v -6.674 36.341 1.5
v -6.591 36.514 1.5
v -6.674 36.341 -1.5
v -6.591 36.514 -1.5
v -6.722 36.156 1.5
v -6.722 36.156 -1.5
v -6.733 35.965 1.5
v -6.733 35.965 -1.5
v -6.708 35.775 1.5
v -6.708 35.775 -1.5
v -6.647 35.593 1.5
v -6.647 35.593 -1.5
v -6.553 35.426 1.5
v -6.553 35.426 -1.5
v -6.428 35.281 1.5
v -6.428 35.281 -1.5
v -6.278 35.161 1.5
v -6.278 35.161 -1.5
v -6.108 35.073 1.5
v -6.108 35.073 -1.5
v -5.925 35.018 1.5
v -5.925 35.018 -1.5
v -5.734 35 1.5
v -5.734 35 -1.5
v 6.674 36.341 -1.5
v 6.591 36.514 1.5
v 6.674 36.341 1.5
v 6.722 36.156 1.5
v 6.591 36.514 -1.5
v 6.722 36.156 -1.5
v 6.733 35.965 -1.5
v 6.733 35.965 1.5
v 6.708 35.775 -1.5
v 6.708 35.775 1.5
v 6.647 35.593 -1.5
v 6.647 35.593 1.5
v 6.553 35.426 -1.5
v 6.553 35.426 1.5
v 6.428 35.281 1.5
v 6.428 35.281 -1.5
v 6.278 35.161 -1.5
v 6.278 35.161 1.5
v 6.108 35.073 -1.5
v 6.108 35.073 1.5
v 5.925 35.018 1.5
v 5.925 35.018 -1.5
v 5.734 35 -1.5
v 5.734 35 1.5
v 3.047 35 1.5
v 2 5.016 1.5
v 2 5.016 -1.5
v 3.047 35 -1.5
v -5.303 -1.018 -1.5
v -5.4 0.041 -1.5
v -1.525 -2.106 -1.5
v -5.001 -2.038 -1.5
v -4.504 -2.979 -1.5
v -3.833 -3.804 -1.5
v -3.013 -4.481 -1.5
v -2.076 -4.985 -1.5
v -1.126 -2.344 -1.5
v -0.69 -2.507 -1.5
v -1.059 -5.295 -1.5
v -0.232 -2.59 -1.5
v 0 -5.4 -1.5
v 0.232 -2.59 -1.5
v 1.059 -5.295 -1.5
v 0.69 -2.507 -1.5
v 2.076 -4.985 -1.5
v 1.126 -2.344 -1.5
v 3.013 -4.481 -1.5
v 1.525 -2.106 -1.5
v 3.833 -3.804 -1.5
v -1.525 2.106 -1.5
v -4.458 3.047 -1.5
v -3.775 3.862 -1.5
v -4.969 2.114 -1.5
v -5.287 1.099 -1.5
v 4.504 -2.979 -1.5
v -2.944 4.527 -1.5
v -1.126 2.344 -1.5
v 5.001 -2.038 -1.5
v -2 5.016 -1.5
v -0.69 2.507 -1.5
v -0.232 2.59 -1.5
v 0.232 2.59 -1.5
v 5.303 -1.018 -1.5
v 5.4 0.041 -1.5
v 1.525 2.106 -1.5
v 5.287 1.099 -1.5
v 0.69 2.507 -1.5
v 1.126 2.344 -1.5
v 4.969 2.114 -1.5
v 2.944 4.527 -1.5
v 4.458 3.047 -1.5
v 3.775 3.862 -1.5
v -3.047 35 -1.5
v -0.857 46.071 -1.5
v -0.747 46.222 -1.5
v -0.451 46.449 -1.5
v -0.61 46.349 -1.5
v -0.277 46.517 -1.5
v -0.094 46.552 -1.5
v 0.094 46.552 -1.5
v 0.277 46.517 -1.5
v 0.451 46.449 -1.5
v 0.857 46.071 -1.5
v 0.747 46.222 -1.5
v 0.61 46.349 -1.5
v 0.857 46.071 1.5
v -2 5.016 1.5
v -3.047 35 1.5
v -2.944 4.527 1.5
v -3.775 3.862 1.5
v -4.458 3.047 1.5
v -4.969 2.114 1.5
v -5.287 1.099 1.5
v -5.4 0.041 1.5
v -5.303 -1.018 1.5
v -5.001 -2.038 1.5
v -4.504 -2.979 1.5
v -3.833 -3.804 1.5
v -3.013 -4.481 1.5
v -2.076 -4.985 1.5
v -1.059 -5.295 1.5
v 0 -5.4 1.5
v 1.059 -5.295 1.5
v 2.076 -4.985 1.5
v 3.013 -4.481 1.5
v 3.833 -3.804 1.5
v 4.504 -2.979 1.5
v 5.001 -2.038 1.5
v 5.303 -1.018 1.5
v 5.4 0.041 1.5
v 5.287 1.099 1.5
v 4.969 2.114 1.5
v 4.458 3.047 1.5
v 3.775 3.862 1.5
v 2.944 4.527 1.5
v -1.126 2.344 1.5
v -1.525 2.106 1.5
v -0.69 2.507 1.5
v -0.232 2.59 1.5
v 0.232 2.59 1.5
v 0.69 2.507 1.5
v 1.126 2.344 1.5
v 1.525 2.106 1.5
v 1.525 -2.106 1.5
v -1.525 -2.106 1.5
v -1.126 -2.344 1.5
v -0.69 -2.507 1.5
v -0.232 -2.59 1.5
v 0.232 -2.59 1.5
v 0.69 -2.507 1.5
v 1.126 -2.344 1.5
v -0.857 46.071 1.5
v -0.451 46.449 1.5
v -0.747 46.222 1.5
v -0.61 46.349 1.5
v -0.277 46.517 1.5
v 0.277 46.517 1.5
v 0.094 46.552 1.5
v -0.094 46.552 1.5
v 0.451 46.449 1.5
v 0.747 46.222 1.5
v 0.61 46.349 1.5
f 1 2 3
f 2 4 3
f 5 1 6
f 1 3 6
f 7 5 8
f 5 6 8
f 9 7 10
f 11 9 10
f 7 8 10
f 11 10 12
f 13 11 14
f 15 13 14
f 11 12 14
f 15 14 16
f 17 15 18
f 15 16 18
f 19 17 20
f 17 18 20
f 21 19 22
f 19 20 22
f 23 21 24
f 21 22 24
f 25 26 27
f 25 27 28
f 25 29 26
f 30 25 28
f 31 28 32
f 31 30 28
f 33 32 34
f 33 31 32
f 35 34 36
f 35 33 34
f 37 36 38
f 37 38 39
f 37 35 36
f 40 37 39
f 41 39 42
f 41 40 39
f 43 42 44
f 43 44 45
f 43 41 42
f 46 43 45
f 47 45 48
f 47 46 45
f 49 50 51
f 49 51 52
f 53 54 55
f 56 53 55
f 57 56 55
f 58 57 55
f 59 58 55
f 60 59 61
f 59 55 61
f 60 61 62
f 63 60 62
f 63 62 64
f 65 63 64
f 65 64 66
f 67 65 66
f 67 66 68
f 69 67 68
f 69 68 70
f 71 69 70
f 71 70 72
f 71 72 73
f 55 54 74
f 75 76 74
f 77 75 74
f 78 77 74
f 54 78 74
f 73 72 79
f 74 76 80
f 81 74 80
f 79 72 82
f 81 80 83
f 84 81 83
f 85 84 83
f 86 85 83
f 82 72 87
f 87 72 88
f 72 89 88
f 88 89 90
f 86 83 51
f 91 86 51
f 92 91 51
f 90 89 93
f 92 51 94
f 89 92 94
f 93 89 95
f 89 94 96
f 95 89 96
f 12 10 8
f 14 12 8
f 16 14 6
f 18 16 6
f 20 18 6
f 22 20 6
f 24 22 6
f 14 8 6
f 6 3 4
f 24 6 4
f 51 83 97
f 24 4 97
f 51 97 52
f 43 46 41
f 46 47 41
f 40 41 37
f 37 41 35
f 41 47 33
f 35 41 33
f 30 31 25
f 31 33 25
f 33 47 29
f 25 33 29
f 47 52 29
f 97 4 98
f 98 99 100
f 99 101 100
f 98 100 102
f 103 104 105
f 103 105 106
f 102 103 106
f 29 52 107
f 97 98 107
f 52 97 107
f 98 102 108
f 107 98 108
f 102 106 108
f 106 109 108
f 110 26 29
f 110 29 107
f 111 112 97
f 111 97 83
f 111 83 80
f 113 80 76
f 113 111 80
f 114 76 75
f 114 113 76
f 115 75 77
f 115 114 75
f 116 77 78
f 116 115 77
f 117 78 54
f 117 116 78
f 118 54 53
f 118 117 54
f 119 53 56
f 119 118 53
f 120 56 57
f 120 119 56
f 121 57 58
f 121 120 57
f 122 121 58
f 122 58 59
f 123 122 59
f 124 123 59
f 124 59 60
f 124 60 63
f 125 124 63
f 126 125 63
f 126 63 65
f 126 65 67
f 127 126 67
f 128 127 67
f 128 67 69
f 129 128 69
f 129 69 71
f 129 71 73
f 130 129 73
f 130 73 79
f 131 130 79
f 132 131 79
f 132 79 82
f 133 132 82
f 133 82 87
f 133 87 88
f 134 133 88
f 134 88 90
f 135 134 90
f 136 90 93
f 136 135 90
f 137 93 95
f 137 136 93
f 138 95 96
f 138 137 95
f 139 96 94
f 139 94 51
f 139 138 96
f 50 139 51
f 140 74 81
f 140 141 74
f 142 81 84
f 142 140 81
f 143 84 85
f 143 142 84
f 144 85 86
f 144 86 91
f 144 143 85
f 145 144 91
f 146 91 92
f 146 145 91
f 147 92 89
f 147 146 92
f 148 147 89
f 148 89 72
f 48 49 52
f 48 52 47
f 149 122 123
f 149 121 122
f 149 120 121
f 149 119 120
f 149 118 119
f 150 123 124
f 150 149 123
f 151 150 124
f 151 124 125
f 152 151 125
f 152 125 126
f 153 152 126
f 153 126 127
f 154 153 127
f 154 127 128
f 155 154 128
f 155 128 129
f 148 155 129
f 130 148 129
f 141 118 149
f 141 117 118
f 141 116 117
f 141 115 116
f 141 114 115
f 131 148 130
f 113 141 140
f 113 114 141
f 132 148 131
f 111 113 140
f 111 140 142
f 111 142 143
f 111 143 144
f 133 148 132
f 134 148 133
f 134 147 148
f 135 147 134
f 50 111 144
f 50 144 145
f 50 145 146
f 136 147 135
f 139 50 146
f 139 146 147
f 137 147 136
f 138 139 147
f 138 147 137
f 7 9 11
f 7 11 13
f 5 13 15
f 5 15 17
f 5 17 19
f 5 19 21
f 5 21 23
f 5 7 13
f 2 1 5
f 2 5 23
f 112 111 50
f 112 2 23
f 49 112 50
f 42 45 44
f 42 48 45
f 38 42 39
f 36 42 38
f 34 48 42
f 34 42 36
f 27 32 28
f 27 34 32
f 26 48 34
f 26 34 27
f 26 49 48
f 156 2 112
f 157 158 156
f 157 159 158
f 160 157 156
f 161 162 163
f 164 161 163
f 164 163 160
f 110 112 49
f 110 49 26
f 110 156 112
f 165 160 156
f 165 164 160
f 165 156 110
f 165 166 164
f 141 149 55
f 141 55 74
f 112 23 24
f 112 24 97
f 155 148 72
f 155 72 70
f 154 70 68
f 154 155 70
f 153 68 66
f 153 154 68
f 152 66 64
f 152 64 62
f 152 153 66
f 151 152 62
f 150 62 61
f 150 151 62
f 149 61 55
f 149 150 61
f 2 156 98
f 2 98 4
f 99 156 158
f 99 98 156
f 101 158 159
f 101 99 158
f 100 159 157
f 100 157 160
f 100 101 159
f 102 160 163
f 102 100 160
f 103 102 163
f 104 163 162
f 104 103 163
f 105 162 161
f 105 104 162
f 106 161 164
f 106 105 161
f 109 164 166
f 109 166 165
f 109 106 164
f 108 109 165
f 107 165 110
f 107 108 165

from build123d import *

# Parameters (mm, degrees)
F0_R     = 5.4
F1_DEPTH = 1.5
F3_DEPTH = 3
F5_DEPTH = 3
F6_R     = 1


with BuildPart() as f1:
    # F0 (on Top) → F1 (new body, symmetric)
    with BuildSketch(Plane.XY):
        Circle(F0_R)
        with BuildLine():
            ThreePointArc((1.525, 2.1057955741), (2.3157072354, 1.1821590418), (2.6, 0))
            ThreePointArc((2.6, 0), (2.3157072354, -1.1821590418), (1.525, -2.1057955741))
            ThreePointArc((1.525, -2.1057955741), (0, -2.6), (-1.525, -2.1057955741))
            ThreePointArc((-1.525, -2.1057955741), (-2.6, 0), (-1.525, 2.1057955741))
            ThreePointArc((-1.525, 2.1057955741), (0, 2.6), (1.525, 2.1057955741))
        make_face(mode=Mode.SUBTRACT)
        with BuildLine():
            ThreePointArc((1.525, -2.1057955741), (2.3157072354, -1.1821590418), (2.6, 0))
            ThreePointArc((2.6, 0), (2.3157072354, 1.1821590418), (1.525, 2.1057955741))
            Line((1.525, 2.1057955741), (1.525, -2.1057955741))
        make_face()
        with BuildLine():
            Line((-1.525, -2.1057955741), (-1.525, 2.1057955741))
            ThreePointArc((-1.525, 2.1057955741), (-2.6, 0), (-1.525, -2.1057955741))
        make_face()
    extrude(amount=F1_DEPTH, both=True)

    # F2 (on face) → F3 (join, through all)
    with BuildSketch(Plane.XY.offset(1.5)):
        with BuildLine():
            ThreePointArc((-2, 5.0159744816), (0, 5.4), (2, 5.0159744816))
            Line((2, 5.0159744816), (3.0470652436, 35))
            Line((3.0470652436, 35), (0, 35))
            Line((0, 35), (-3.0470652436, 35))
            Line((-3.0470652436, 35), (-2, 5.0159744816))
        make_face()
    extrude(amount=-F3_DEPTH)

    # F4 (on face) → F5 (join, through all)
    with BuildSketch(Plane.XY.offset(1.5)):
        Polygon((0, 47.5), (-7.5, 35), (-3.0470652436, 35), (3.0470652436, 35), (7.5, 35), align=None)
    extrude(amount=-F5_DEPTH)

    # F6
    f6_edges = [f1.edges().sort_by_distance(p)[0] for p in [
        (-7.5, 35, 0),
        (0, 47.5, 0),
        (7.5, 35, 0),
    ]]
    fillet(f6_edges, radius=F6_R)


solid = f1.part
